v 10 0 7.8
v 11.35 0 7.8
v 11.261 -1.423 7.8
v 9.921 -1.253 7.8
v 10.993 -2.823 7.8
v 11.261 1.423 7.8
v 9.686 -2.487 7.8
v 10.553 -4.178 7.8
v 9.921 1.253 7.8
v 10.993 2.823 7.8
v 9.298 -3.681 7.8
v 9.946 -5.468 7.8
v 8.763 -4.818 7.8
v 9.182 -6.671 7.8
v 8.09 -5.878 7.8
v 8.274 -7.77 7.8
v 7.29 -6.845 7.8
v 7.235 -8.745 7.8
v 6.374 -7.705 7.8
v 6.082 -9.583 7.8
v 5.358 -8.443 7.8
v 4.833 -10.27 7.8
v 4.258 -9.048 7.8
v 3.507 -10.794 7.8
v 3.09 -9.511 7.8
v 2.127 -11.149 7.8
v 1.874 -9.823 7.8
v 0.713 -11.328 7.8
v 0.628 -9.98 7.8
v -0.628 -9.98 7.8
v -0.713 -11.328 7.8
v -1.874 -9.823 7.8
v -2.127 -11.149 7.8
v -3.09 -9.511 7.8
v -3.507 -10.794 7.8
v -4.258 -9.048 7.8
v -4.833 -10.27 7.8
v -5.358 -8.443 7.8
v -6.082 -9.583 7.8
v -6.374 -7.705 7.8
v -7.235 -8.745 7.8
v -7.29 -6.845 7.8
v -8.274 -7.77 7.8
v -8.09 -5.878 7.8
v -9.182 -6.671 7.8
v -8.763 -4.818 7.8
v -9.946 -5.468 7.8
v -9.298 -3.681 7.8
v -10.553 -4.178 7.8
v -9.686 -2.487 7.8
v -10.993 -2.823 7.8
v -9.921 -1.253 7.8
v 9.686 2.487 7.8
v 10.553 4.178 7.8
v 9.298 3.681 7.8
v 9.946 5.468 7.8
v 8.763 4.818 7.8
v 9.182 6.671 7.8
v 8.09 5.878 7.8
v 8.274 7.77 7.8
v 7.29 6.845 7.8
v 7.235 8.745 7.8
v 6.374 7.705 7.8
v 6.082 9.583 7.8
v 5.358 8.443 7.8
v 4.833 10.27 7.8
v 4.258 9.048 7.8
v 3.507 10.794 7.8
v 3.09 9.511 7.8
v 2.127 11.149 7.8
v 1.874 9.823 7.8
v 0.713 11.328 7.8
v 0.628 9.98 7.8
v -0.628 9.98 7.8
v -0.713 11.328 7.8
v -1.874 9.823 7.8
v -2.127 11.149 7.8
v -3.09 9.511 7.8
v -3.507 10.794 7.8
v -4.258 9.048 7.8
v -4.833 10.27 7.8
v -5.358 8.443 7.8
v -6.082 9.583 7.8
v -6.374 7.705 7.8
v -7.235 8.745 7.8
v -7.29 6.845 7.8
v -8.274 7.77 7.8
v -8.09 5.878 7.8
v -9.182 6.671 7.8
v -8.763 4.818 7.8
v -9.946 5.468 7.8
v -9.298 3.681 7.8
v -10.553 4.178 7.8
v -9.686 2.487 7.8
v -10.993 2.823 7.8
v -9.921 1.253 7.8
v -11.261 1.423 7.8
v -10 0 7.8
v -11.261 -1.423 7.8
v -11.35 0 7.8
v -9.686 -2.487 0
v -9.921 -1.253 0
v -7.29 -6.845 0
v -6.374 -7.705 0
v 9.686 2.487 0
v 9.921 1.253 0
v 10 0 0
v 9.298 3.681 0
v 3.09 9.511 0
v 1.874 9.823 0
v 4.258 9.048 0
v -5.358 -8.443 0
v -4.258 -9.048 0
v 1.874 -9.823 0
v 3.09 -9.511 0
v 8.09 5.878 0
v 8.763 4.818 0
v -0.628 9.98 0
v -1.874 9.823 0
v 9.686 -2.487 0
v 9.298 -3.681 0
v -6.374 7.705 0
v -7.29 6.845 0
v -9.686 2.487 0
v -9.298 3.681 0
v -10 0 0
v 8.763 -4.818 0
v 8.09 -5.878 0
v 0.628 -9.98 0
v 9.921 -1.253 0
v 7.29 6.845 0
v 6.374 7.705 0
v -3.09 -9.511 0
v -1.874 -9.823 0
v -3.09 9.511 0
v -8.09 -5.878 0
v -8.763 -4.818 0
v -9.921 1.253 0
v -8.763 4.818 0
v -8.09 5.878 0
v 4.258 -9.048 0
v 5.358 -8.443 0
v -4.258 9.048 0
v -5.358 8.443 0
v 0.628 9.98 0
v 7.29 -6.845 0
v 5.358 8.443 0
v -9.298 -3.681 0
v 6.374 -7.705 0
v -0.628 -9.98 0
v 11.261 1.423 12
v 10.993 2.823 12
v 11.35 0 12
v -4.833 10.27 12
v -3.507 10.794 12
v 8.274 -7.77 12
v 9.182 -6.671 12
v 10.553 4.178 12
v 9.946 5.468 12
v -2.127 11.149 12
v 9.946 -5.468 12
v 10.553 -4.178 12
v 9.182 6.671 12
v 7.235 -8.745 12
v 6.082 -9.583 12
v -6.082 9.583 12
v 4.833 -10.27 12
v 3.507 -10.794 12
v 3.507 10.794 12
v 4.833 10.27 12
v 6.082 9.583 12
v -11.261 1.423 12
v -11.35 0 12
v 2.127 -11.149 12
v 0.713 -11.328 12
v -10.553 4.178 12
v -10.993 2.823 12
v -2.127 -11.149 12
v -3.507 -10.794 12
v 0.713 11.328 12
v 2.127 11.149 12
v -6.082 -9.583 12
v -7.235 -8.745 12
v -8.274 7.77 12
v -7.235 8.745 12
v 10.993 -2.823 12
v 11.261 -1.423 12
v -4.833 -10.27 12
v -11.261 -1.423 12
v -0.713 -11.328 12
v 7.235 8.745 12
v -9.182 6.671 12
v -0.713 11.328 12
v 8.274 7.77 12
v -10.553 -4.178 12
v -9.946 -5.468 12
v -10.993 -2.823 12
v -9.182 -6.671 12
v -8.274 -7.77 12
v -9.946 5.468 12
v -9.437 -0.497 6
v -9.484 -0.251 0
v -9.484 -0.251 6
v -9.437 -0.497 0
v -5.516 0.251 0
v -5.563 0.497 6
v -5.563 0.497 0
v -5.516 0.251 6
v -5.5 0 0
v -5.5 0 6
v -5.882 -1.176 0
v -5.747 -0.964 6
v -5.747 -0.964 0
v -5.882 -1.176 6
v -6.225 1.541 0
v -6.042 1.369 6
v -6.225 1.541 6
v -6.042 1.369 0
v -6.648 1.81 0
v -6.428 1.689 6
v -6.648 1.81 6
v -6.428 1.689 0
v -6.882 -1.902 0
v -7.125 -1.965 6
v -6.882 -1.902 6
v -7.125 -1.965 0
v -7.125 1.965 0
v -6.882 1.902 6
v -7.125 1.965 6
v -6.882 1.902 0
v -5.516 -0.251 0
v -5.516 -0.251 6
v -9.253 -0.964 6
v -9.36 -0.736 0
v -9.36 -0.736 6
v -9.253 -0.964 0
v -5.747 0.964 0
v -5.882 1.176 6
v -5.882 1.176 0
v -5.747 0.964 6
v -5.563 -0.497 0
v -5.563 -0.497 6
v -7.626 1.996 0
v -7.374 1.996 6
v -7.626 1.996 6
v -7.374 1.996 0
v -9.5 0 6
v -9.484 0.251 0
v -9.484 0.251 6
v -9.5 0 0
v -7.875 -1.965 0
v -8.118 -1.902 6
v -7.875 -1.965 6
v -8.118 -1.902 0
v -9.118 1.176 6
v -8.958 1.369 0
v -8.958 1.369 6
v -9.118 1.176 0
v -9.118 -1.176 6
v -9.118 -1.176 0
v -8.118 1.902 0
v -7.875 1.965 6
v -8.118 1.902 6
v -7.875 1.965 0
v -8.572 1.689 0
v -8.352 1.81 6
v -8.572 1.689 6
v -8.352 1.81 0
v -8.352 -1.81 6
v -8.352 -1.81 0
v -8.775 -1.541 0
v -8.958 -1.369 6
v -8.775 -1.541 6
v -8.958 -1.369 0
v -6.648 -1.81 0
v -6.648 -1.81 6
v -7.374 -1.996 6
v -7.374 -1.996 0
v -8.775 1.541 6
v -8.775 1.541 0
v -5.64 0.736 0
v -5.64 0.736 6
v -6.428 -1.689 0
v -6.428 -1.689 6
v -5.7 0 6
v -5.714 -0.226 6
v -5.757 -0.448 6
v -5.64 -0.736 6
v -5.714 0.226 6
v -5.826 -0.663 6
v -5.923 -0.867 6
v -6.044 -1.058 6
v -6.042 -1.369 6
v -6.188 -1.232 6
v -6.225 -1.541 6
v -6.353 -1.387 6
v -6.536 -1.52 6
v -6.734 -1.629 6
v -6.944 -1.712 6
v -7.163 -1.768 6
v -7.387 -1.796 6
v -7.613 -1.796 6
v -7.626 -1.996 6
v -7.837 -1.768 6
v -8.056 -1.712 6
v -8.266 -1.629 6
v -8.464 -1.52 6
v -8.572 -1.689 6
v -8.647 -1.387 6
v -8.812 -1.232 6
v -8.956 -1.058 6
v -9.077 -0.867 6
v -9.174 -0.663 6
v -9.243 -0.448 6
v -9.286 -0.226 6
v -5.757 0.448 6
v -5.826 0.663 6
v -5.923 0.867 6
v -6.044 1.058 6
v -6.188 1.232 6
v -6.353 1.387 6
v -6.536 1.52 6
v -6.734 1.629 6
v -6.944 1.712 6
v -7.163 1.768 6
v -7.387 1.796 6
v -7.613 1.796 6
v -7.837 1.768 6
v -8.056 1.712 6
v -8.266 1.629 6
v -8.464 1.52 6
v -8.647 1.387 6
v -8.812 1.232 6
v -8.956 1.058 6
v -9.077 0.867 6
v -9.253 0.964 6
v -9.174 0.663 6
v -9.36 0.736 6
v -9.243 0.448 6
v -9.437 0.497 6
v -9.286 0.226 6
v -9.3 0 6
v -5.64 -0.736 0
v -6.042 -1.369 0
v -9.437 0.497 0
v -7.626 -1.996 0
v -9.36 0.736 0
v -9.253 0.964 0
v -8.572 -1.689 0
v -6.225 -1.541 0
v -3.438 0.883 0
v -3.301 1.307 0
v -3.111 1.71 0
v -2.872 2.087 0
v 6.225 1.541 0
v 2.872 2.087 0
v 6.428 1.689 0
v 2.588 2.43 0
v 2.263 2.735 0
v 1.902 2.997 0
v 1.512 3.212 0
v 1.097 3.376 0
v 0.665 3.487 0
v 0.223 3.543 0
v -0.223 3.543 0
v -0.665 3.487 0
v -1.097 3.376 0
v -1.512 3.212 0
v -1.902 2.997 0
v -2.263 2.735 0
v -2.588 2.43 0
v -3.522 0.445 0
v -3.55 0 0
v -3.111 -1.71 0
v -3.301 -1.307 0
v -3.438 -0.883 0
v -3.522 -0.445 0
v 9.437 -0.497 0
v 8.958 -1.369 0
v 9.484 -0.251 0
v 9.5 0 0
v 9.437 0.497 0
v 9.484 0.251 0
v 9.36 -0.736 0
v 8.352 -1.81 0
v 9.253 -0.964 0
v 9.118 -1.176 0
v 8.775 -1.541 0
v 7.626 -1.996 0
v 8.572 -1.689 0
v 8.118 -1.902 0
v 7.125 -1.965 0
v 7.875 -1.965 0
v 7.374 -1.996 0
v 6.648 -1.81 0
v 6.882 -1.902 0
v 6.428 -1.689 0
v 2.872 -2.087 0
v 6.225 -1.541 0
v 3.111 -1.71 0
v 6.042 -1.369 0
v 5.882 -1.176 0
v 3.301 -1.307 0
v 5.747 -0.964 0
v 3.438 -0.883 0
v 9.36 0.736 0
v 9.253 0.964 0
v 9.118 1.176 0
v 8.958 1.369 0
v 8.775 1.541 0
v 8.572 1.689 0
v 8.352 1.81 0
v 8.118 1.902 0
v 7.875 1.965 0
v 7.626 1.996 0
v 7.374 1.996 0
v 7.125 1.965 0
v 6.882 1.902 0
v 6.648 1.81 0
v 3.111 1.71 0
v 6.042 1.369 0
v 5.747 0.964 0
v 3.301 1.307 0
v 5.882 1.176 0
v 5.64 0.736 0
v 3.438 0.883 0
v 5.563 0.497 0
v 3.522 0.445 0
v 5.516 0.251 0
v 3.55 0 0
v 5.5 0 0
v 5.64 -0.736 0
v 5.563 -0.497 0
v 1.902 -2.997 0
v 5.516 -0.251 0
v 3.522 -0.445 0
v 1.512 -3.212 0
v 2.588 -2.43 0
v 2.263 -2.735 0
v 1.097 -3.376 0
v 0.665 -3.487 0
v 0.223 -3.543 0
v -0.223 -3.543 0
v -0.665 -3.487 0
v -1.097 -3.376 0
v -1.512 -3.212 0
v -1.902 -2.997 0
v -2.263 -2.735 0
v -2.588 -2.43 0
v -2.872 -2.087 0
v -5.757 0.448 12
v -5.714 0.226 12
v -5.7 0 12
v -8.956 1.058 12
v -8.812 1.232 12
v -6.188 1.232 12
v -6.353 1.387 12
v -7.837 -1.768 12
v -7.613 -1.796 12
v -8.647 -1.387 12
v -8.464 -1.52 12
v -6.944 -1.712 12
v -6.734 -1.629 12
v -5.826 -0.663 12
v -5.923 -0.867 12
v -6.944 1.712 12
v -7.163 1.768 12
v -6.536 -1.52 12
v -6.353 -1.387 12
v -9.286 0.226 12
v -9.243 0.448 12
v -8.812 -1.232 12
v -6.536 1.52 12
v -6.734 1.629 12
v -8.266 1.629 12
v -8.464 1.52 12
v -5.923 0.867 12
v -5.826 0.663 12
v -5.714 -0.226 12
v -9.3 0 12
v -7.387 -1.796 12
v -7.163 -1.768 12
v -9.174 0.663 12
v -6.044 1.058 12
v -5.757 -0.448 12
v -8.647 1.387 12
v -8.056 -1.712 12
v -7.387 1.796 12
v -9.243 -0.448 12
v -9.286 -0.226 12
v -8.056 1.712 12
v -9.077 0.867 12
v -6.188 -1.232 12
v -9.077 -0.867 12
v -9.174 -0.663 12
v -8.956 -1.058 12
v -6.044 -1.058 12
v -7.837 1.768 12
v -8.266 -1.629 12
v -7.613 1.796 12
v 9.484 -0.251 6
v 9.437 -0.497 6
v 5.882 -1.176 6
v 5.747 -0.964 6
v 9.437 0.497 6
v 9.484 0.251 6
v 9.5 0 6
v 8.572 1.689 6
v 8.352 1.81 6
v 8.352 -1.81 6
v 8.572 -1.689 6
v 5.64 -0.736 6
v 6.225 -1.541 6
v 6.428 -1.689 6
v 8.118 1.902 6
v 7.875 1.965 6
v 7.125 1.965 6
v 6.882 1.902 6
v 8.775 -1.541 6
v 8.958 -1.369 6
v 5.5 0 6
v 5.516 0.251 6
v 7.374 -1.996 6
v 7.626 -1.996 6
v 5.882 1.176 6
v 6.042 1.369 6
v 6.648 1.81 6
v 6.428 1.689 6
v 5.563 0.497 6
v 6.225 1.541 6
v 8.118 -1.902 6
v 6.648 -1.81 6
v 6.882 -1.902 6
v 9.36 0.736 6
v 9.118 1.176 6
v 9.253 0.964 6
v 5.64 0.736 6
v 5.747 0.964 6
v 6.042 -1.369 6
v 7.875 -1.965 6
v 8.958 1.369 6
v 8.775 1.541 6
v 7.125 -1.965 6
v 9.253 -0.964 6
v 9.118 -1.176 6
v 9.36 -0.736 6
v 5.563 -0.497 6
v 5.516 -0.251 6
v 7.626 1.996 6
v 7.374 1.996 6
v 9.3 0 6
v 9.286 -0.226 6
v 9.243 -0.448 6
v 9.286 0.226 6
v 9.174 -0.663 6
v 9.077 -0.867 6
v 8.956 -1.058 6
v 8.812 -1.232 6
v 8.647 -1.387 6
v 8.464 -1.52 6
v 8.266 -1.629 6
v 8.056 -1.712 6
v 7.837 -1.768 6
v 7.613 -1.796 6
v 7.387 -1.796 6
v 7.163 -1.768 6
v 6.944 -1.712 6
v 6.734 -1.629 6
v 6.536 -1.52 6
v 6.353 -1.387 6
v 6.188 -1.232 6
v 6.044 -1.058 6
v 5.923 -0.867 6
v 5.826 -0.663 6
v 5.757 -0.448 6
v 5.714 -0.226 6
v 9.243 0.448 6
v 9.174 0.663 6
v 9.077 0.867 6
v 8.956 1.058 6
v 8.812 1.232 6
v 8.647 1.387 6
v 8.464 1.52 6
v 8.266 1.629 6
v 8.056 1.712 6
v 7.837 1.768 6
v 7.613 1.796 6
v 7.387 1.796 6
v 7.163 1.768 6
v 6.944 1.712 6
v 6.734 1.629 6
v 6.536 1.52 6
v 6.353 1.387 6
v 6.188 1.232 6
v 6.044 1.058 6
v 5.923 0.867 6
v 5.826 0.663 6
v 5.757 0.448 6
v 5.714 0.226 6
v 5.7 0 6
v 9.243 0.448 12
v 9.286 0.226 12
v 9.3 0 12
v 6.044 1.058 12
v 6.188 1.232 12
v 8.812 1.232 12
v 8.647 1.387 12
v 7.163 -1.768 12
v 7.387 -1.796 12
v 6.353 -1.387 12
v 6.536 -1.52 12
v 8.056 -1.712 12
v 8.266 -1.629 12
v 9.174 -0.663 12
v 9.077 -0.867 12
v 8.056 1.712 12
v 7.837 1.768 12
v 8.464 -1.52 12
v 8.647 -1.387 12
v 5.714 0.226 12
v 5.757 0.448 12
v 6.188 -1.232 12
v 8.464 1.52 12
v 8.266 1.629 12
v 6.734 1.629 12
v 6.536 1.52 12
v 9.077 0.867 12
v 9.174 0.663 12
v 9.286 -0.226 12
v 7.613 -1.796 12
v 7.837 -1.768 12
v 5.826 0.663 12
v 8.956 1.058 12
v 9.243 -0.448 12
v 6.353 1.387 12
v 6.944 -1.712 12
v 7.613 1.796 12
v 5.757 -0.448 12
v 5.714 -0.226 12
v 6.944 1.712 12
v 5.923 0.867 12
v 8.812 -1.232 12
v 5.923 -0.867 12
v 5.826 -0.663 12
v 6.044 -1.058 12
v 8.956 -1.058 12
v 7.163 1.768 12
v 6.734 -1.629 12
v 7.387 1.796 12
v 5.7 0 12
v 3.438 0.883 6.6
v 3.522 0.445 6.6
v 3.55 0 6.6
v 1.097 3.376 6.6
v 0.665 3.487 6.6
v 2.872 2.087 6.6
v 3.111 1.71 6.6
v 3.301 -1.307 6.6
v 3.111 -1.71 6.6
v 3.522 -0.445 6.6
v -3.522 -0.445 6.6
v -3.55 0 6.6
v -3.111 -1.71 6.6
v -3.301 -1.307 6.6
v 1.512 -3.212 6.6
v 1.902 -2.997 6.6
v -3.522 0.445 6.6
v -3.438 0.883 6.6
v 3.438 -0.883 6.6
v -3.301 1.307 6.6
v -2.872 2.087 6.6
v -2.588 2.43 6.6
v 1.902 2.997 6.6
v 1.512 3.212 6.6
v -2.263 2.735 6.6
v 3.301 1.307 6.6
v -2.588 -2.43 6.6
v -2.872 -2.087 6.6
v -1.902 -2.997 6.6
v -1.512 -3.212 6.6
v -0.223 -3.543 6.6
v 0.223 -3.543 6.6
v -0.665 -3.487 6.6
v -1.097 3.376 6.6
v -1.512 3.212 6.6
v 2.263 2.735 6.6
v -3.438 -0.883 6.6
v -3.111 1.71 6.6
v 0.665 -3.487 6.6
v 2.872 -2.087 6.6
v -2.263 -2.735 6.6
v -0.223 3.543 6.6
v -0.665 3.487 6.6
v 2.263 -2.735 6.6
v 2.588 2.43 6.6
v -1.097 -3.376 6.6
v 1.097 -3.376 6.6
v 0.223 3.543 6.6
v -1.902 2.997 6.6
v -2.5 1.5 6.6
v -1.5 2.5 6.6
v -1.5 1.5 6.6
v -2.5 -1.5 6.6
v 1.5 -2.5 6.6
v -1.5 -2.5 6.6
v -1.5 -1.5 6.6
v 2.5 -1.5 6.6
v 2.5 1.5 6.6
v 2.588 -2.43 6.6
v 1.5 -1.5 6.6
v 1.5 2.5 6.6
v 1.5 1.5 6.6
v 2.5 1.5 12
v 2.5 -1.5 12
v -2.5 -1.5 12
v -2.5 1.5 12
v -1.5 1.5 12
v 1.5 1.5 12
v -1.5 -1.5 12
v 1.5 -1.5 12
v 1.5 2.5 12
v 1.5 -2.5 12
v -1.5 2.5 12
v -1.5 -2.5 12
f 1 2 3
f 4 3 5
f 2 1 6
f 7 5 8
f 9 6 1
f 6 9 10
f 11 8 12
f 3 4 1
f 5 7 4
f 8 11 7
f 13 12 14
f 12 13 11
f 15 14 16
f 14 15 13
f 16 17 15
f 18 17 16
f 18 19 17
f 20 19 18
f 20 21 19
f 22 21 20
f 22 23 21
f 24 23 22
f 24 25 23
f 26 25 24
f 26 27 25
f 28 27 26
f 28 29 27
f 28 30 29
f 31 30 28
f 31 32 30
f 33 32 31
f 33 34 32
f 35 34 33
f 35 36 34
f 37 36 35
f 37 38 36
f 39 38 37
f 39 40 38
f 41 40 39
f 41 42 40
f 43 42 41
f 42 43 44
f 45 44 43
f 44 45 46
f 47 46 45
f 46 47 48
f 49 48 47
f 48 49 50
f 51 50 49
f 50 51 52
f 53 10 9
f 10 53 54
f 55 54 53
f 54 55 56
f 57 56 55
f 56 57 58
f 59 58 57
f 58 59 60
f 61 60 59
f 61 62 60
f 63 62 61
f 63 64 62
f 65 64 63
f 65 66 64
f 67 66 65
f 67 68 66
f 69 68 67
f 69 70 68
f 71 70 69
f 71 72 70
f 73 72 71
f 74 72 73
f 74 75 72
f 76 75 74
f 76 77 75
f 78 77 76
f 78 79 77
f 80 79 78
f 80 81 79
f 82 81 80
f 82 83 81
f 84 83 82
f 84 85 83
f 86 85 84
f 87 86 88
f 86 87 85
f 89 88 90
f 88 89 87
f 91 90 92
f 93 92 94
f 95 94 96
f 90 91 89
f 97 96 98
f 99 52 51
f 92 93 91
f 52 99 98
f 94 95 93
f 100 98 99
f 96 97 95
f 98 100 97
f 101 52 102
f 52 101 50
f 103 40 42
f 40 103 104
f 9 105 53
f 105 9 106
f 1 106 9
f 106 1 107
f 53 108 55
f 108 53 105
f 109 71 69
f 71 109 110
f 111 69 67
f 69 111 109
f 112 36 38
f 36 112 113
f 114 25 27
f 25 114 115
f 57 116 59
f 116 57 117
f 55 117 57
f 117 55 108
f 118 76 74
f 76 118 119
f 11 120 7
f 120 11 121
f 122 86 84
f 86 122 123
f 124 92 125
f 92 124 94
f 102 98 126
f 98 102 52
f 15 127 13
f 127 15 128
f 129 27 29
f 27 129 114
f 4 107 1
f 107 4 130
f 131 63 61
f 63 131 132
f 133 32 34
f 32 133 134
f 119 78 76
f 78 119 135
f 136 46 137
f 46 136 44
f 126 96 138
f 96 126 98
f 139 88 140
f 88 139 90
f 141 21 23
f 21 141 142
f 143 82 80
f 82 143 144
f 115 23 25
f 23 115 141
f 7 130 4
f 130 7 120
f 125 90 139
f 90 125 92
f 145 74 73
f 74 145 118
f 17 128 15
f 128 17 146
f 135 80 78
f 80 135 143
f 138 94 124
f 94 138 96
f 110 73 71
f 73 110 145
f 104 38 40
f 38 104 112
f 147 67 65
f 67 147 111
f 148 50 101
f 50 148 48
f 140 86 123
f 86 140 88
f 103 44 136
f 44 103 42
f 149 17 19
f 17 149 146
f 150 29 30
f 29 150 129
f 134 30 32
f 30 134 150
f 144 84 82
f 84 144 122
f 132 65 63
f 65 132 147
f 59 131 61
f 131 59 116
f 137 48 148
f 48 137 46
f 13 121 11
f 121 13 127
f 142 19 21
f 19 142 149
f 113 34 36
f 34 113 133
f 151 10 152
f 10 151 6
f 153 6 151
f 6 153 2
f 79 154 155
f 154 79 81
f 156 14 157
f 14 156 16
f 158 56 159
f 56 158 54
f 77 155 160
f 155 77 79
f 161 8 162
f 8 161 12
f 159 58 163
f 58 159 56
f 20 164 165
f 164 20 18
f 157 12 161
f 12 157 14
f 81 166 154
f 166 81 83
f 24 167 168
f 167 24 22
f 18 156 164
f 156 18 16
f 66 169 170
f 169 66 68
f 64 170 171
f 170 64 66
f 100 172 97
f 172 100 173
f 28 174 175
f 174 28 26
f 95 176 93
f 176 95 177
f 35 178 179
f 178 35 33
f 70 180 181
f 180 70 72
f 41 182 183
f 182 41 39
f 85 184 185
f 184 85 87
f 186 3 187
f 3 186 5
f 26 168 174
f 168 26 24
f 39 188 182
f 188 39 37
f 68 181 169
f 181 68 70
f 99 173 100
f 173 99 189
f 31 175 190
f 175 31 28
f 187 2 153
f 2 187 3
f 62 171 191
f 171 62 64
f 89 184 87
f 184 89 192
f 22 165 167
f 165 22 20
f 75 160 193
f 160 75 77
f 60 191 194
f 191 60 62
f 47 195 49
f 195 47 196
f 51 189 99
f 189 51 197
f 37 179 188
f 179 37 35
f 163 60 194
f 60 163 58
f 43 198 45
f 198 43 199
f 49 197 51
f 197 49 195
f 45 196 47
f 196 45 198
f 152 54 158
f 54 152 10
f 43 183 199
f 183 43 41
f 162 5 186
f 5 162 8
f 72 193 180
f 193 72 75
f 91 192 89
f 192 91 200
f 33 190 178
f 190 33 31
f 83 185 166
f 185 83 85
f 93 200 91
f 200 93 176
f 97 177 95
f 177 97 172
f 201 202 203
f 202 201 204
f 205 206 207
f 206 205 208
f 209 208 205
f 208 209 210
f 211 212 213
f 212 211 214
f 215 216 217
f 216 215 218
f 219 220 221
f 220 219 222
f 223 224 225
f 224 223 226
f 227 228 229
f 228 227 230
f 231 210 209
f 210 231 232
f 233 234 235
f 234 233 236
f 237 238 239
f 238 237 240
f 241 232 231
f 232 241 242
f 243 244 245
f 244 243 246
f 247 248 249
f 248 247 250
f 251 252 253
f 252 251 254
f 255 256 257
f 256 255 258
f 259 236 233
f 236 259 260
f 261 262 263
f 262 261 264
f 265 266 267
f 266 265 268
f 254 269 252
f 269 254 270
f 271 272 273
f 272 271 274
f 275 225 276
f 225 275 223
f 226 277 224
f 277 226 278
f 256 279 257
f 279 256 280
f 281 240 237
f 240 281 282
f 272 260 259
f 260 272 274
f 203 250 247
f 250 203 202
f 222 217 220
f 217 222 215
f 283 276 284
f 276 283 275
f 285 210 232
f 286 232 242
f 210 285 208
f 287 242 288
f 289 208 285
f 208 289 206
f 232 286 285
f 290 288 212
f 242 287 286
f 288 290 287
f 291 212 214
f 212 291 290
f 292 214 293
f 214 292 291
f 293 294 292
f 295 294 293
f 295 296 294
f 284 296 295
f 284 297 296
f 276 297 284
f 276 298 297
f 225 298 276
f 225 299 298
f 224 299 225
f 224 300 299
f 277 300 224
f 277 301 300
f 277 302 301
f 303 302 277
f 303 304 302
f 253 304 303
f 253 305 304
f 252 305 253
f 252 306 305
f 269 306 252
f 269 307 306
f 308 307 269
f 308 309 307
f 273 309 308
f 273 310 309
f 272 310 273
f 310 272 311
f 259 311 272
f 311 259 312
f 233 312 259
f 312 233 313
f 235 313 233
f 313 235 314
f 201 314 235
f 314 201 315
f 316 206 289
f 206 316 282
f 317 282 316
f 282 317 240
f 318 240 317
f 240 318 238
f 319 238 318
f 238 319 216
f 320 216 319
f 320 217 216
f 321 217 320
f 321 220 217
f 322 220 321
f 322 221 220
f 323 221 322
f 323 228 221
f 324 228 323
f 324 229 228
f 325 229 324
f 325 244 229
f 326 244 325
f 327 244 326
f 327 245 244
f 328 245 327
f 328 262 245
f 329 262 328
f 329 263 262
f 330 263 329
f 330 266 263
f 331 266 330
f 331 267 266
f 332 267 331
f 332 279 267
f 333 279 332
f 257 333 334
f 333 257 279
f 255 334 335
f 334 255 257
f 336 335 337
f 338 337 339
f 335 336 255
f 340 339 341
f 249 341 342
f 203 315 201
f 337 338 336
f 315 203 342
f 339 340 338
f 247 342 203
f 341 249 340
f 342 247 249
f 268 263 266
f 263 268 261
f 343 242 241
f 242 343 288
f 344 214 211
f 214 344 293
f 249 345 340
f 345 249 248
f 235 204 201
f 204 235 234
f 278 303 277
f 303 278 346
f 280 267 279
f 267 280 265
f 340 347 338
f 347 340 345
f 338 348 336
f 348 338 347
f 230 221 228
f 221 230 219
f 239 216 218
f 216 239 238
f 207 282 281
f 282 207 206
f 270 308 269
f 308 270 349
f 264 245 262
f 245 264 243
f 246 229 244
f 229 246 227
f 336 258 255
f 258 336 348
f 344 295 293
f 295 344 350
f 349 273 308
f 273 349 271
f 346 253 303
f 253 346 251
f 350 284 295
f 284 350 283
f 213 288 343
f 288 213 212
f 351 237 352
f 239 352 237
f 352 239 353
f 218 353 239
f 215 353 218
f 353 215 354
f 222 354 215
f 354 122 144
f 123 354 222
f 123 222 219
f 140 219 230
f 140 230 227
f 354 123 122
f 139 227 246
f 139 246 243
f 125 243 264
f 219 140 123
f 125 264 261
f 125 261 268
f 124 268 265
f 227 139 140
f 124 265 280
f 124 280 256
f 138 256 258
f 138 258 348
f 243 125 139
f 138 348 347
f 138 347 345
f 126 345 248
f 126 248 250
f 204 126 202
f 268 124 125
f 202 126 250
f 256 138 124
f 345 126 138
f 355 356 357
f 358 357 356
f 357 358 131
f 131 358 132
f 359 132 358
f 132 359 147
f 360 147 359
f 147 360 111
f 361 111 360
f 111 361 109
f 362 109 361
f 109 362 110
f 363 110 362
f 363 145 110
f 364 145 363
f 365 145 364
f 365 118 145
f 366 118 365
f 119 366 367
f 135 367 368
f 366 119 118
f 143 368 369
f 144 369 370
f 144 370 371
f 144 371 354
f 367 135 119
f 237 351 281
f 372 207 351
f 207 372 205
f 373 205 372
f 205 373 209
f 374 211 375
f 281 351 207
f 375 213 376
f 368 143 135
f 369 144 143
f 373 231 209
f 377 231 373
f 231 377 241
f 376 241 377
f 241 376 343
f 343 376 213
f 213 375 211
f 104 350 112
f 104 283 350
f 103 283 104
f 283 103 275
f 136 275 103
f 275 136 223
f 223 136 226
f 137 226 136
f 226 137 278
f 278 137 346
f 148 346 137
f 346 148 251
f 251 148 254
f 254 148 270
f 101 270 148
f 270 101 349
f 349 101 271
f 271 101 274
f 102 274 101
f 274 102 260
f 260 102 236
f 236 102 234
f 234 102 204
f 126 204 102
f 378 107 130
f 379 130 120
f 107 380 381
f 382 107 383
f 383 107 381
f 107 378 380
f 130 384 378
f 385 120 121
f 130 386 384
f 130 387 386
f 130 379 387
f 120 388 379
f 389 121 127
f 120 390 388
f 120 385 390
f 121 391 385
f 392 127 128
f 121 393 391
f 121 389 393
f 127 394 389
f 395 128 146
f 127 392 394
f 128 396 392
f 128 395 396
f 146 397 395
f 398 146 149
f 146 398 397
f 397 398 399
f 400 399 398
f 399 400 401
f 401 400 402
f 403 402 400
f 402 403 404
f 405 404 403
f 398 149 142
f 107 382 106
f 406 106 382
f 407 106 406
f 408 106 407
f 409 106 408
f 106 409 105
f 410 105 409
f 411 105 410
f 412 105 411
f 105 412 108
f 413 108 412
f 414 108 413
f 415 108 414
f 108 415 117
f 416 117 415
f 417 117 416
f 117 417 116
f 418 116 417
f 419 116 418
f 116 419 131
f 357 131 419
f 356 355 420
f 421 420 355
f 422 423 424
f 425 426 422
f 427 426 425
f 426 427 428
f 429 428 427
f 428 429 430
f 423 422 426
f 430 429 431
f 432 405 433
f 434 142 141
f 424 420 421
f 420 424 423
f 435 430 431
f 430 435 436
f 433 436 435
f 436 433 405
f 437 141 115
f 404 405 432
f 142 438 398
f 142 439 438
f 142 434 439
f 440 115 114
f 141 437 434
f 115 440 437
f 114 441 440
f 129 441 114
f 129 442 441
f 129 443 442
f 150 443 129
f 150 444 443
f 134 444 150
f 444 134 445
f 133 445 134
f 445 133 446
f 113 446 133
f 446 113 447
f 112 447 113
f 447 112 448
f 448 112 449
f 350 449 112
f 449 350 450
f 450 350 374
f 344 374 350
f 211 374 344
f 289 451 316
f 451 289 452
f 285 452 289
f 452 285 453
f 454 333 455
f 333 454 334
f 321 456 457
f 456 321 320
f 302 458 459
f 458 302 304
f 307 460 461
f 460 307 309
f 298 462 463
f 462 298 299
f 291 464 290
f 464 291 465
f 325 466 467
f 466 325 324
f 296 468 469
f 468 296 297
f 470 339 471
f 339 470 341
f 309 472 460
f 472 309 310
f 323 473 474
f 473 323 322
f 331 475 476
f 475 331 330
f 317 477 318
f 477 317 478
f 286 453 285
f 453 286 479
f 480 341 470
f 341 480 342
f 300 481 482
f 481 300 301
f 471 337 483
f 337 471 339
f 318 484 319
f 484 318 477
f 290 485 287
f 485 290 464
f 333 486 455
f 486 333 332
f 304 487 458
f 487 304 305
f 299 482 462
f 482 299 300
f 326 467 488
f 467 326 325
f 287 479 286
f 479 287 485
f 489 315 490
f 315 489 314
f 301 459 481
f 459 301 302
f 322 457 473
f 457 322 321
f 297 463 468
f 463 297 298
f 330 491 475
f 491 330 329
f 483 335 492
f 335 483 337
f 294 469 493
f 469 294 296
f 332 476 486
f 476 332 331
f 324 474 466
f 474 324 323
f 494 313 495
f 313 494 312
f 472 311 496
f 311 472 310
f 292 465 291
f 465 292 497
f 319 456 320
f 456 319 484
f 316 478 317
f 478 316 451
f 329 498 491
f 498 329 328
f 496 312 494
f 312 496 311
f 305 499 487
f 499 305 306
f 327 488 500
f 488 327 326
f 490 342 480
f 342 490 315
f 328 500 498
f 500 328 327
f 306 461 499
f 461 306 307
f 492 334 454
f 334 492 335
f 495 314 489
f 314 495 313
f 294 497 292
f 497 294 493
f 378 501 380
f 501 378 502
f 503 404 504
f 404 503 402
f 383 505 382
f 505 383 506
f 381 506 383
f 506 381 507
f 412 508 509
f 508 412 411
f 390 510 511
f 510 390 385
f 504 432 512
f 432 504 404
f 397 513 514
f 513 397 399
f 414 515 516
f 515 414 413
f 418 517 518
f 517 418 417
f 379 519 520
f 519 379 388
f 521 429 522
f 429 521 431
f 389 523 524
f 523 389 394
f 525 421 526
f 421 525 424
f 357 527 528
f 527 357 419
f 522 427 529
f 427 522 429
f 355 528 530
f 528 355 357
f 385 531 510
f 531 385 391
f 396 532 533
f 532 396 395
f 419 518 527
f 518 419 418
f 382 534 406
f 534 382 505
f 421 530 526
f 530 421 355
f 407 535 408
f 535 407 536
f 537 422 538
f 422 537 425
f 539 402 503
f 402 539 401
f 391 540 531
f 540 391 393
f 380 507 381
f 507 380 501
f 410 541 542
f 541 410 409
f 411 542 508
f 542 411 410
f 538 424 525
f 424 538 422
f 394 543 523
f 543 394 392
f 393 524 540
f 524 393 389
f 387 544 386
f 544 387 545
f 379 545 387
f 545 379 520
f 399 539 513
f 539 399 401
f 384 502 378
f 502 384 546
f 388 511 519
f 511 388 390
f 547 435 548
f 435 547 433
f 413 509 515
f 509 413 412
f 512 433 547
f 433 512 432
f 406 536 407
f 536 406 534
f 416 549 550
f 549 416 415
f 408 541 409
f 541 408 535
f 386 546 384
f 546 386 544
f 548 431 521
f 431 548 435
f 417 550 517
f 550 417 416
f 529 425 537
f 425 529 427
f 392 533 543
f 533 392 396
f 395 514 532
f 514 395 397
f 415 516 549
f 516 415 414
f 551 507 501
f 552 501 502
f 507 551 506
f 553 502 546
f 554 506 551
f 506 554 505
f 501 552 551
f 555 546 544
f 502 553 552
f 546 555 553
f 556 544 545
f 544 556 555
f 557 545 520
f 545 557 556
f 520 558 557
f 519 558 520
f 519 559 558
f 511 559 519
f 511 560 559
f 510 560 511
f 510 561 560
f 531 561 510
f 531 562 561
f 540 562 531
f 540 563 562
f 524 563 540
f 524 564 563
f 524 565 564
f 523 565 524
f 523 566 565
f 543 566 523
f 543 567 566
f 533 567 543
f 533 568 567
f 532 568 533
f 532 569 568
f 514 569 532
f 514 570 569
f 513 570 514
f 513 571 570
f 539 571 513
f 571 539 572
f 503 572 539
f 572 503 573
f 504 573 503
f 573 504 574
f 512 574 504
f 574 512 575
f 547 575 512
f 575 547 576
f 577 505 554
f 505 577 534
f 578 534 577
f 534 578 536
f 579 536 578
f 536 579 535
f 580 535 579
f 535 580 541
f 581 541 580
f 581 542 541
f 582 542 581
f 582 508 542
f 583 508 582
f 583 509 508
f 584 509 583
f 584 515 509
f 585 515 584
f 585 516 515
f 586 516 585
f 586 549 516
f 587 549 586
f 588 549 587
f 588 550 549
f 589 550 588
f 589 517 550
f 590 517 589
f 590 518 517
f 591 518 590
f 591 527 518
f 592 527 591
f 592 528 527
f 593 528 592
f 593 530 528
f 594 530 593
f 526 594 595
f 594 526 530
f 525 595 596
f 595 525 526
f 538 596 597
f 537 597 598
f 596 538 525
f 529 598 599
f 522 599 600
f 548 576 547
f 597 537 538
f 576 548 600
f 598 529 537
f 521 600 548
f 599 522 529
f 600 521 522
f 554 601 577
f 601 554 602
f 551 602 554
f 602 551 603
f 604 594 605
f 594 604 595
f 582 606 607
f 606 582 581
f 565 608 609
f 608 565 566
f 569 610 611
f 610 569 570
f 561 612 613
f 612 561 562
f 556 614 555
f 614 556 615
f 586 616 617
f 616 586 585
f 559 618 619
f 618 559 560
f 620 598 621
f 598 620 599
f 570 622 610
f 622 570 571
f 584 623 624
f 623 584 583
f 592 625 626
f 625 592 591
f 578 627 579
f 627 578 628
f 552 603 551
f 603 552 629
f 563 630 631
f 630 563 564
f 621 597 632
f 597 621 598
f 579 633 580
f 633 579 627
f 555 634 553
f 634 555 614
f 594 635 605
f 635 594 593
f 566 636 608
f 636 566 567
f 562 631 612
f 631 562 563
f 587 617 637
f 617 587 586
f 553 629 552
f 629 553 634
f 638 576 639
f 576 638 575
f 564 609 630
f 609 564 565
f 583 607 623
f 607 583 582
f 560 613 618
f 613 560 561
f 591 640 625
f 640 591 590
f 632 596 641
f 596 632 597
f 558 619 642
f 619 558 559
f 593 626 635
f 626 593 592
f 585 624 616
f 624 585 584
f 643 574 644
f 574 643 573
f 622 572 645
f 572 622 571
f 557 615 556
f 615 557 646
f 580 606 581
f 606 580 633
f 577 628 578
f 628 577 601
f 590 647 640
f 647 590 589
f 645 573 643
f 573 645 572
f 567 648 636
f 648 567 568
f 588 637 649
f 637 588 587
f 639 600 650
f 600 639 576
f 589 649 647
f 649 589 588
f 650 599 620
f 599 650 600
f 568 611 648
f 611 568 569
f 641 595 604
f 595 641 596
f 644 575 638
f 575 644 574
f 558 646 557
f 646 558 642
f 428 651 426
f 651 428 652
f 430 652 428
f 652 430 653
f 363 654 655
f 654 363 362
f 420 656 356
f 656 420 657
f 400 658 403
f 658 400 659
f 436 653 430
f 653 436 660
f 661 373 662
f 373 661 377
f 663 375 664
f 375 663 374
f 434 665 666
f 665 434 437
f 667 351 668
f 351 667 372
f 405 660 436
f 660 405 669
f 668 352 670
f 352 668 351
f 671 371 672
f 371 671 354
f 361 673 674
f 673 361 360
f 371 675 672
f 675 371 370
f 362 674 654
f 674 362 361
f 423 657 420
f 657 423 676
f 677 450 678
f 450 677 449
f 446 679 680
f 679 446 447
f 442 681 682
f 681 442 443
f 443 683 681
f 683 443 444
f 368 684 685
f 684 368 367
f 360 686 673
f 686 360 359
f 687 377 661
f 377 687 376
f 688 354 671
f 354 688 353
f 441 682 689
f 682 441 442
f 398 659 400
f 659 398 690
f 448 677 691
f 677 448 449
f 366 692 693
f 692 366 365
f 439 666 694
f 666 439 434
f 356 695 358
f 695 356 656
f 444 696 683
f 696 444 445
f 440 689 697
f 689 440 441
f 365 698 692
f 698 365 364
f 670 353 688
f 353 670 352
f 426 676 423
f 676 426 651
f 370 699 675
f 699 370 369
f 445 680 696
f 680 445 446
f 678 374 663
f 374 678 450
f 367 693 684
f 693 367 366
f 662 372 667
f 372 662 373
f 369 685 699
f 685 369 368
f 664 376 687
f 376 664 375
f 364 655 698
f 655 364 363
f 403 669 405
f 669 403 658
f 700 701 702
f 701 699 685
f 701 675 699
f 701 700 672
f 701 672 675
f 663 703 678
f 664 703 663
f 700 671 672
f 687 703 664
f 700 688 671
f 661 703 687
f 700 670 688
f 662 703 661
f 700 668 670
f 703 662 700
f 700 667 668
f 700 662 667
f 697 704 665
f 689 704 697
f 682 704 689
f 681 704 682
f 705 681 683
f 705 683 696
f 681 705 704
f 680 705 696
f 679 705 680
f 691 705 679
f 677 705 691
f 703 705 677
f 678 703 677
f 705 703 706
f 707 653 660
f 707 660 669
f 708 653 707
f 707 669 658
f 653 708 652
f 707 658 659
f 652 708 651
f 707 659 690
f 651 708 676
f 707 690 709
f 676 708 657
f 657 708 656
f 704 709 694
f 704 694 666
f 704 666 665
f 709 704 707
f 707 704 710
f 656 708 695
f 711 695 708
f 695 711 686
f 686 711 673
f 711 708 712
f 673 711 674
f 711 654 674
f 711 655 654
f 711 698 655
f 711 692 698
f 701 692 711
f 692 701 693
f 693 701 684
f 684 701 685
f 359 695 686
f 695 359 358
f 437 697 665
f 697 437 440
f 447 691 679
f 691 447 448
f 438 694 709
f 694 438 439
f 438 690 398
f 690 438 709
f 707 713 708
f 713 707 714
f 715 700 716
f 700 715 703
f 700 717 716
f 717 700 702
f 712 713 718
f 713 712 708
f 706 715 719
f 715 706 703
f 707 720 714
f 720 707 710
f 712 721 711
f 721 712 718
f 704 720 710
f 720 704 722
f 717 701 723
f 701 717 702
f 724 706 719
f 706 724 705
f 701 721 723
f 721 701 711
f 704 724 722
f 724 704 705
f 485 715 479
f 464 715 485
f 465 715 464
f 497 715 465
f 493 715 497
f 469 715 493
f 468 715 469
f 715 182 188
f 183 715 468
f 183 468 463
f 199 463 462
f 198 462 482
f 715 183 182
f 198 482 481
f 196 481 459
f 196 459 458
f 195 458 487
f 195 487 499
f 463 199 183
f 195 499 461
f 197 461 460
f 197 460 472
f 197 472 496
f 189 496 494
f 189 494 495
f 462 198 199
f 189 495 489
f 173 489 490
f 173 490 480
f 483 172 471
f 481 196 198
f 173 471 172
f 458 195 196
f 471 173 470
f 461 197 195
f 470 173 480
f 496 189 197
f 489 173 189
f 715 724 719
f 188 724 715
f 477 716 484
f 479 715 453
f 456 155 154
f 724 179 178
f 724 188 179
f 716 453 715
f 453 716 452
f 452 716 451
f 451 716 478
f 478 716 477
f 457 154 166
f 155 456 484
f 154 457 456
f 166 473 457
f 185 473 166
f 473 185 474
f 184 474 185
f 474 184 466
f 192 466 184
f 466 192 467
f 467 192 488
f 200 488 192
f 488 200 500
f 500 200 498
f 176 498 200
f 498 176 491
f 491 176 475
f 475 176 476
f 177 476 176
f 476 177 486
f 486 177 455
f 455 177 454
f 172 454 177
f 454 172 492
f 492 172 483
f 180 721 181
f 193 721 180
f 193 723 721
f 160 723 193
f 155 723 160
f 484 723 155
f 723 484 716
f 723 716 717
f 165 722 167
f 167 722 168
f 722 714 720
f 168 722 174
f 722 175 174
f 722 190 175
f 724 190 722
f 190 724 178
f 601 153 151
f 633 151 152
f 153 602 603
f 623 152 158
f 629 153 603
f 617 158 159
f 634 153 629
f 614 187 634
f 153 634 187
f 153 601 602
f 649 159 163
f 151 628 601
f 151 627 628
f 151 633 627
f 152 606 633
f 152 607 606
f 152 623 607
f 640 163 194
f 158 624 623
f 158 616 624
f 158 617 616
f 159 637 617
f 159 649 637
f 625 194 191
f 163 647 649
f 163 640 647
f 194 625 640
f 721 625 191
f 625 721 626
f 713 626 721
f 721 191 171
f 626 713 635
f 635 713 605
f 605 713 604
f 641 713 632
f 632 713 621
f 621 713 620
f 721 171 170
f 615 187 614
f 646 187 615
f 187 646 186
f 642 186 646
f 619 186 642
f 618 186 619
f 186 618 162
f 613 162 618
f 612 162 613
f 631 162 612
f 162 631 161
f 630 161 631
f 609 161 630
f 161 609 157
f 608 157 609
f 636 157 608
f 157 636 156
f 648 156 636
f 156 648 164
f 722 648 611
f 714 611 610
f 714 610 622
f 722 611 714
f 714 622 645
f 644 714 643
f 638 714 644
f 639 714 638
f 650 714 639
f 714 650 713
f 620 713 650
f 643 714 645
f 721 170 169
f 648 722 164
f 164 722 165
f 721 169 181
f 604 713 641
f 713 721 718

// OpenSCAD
$fn = 50;

difference() {
	union() {
		translate(v = [0, 0, 0]) {
			rotate(a = [0, 0, 0]) {
				difference() {
					union() {
						translate(v = [0, 0, 6.0]) {
							rotate(a = [0, 0, 0]) {
								difference() {
									union() {
										translate(v = [0, 0, -6.0]) {
											cylinder(h = 12, r = 12);
										}
									}
									union() {
										translate(v = [0, 0, 0]) {
											rotate(a = [0, 0, 0]) {
												difference() {
													union() {
														translate(v = [0, 0, -1.8]) {
															cylinder(h = 3.6, r = 13.7);
														}
													}
													union() {
														translate(v = [0, 0, -1.81]) {
															cylinder(h = 3.62, r = 10.0);
														}
													}
												}
											}
										}
										translate(v = [0, 0, -3]) {
											rotate(a = [0, 0, 0]) {
												difference() {
													union() {
														translate(v = [0, 0, -1.8]) {
															cylinder(h = 3.6, r = 13.7);
														}
													}
													union() {
														translate(v = [0, 0, -1.81]) {
															cylinder(h = 3.62, r = 10.0);
														}
													}
												}
											}
										}
										translate(v = [0, 0, -6]) {
											rotate(a = [0, 0, 0]) {
												difference() {
													union() {
														translate(v = [0, 0, -1.8]) {
															cylinder(h = 3.6, r = 13.7);
														}
													}
													union() {
														translate(v = [0, 0, -1.81]) {
															cylinder(h = 3.62, r = 10.0);
														}
													}
												}
											}
										}
										translate(v = [0, 0, 0]) {
											rotate(a = [0, 0, 0]) {
												difference() {
													union() {
														translate(v = [0, 0, -21.0]) {
															cylinder(h = 42, r = 12.35);
														}
													}
													union() {
														translate(v = [0, 0, -21.01]) {
															cylinder(h = 42.02, r = 11.35);
														}
													}
												}
											}
										}
										translate(v = [-15.0, -15.0, -100.0]) {
											cylinder(h = 200, r = 3.25);
										}
										translate(v = [-15.0, 15.0, -100.0]) {
											cylinder(h = 200, r = 3.25);
										}
										translate(v = [15.0, -15.0, -100.0]) {
											cylinder(h = 200, r = 3.25);
										}
										translate(v = [15.0, 15.0, -100.0]) {
											cylinder(h = 200, r = 3.25);
										}
										translate(v = [-7.5, 0, -6.0]) {
											cylinder(h = 6, r = 2.0);
										}
										translate(v = [-7.5, 0, -7.0]) {
											cylinder(h = 14, r = 1.8);
										}
										translate(v = [7.5, 0, -6.0]) {
											cylinder(h = 6, r = 2.0);
										}
										translate(v = [7.5, 0, -7.0]) {
											cylinder(h = 14, r = 1.8);
										}
										translate(v = [0, 0, -6.000000000000001]) {
											cylinder(h = 6.6, r = 3.55);
										}
										translate(v = [-2.5, -1.5, -7.0]) {
											cube(size = [5, 3, 14]);
										}
										translate(v = [-1.5, -2.5, -7.0]) {
											cube(size = [3, 5, 14]);
										}
									}
								}
							}
						}
					}
					union();
				}
			}
		}
	}
	union();
}
